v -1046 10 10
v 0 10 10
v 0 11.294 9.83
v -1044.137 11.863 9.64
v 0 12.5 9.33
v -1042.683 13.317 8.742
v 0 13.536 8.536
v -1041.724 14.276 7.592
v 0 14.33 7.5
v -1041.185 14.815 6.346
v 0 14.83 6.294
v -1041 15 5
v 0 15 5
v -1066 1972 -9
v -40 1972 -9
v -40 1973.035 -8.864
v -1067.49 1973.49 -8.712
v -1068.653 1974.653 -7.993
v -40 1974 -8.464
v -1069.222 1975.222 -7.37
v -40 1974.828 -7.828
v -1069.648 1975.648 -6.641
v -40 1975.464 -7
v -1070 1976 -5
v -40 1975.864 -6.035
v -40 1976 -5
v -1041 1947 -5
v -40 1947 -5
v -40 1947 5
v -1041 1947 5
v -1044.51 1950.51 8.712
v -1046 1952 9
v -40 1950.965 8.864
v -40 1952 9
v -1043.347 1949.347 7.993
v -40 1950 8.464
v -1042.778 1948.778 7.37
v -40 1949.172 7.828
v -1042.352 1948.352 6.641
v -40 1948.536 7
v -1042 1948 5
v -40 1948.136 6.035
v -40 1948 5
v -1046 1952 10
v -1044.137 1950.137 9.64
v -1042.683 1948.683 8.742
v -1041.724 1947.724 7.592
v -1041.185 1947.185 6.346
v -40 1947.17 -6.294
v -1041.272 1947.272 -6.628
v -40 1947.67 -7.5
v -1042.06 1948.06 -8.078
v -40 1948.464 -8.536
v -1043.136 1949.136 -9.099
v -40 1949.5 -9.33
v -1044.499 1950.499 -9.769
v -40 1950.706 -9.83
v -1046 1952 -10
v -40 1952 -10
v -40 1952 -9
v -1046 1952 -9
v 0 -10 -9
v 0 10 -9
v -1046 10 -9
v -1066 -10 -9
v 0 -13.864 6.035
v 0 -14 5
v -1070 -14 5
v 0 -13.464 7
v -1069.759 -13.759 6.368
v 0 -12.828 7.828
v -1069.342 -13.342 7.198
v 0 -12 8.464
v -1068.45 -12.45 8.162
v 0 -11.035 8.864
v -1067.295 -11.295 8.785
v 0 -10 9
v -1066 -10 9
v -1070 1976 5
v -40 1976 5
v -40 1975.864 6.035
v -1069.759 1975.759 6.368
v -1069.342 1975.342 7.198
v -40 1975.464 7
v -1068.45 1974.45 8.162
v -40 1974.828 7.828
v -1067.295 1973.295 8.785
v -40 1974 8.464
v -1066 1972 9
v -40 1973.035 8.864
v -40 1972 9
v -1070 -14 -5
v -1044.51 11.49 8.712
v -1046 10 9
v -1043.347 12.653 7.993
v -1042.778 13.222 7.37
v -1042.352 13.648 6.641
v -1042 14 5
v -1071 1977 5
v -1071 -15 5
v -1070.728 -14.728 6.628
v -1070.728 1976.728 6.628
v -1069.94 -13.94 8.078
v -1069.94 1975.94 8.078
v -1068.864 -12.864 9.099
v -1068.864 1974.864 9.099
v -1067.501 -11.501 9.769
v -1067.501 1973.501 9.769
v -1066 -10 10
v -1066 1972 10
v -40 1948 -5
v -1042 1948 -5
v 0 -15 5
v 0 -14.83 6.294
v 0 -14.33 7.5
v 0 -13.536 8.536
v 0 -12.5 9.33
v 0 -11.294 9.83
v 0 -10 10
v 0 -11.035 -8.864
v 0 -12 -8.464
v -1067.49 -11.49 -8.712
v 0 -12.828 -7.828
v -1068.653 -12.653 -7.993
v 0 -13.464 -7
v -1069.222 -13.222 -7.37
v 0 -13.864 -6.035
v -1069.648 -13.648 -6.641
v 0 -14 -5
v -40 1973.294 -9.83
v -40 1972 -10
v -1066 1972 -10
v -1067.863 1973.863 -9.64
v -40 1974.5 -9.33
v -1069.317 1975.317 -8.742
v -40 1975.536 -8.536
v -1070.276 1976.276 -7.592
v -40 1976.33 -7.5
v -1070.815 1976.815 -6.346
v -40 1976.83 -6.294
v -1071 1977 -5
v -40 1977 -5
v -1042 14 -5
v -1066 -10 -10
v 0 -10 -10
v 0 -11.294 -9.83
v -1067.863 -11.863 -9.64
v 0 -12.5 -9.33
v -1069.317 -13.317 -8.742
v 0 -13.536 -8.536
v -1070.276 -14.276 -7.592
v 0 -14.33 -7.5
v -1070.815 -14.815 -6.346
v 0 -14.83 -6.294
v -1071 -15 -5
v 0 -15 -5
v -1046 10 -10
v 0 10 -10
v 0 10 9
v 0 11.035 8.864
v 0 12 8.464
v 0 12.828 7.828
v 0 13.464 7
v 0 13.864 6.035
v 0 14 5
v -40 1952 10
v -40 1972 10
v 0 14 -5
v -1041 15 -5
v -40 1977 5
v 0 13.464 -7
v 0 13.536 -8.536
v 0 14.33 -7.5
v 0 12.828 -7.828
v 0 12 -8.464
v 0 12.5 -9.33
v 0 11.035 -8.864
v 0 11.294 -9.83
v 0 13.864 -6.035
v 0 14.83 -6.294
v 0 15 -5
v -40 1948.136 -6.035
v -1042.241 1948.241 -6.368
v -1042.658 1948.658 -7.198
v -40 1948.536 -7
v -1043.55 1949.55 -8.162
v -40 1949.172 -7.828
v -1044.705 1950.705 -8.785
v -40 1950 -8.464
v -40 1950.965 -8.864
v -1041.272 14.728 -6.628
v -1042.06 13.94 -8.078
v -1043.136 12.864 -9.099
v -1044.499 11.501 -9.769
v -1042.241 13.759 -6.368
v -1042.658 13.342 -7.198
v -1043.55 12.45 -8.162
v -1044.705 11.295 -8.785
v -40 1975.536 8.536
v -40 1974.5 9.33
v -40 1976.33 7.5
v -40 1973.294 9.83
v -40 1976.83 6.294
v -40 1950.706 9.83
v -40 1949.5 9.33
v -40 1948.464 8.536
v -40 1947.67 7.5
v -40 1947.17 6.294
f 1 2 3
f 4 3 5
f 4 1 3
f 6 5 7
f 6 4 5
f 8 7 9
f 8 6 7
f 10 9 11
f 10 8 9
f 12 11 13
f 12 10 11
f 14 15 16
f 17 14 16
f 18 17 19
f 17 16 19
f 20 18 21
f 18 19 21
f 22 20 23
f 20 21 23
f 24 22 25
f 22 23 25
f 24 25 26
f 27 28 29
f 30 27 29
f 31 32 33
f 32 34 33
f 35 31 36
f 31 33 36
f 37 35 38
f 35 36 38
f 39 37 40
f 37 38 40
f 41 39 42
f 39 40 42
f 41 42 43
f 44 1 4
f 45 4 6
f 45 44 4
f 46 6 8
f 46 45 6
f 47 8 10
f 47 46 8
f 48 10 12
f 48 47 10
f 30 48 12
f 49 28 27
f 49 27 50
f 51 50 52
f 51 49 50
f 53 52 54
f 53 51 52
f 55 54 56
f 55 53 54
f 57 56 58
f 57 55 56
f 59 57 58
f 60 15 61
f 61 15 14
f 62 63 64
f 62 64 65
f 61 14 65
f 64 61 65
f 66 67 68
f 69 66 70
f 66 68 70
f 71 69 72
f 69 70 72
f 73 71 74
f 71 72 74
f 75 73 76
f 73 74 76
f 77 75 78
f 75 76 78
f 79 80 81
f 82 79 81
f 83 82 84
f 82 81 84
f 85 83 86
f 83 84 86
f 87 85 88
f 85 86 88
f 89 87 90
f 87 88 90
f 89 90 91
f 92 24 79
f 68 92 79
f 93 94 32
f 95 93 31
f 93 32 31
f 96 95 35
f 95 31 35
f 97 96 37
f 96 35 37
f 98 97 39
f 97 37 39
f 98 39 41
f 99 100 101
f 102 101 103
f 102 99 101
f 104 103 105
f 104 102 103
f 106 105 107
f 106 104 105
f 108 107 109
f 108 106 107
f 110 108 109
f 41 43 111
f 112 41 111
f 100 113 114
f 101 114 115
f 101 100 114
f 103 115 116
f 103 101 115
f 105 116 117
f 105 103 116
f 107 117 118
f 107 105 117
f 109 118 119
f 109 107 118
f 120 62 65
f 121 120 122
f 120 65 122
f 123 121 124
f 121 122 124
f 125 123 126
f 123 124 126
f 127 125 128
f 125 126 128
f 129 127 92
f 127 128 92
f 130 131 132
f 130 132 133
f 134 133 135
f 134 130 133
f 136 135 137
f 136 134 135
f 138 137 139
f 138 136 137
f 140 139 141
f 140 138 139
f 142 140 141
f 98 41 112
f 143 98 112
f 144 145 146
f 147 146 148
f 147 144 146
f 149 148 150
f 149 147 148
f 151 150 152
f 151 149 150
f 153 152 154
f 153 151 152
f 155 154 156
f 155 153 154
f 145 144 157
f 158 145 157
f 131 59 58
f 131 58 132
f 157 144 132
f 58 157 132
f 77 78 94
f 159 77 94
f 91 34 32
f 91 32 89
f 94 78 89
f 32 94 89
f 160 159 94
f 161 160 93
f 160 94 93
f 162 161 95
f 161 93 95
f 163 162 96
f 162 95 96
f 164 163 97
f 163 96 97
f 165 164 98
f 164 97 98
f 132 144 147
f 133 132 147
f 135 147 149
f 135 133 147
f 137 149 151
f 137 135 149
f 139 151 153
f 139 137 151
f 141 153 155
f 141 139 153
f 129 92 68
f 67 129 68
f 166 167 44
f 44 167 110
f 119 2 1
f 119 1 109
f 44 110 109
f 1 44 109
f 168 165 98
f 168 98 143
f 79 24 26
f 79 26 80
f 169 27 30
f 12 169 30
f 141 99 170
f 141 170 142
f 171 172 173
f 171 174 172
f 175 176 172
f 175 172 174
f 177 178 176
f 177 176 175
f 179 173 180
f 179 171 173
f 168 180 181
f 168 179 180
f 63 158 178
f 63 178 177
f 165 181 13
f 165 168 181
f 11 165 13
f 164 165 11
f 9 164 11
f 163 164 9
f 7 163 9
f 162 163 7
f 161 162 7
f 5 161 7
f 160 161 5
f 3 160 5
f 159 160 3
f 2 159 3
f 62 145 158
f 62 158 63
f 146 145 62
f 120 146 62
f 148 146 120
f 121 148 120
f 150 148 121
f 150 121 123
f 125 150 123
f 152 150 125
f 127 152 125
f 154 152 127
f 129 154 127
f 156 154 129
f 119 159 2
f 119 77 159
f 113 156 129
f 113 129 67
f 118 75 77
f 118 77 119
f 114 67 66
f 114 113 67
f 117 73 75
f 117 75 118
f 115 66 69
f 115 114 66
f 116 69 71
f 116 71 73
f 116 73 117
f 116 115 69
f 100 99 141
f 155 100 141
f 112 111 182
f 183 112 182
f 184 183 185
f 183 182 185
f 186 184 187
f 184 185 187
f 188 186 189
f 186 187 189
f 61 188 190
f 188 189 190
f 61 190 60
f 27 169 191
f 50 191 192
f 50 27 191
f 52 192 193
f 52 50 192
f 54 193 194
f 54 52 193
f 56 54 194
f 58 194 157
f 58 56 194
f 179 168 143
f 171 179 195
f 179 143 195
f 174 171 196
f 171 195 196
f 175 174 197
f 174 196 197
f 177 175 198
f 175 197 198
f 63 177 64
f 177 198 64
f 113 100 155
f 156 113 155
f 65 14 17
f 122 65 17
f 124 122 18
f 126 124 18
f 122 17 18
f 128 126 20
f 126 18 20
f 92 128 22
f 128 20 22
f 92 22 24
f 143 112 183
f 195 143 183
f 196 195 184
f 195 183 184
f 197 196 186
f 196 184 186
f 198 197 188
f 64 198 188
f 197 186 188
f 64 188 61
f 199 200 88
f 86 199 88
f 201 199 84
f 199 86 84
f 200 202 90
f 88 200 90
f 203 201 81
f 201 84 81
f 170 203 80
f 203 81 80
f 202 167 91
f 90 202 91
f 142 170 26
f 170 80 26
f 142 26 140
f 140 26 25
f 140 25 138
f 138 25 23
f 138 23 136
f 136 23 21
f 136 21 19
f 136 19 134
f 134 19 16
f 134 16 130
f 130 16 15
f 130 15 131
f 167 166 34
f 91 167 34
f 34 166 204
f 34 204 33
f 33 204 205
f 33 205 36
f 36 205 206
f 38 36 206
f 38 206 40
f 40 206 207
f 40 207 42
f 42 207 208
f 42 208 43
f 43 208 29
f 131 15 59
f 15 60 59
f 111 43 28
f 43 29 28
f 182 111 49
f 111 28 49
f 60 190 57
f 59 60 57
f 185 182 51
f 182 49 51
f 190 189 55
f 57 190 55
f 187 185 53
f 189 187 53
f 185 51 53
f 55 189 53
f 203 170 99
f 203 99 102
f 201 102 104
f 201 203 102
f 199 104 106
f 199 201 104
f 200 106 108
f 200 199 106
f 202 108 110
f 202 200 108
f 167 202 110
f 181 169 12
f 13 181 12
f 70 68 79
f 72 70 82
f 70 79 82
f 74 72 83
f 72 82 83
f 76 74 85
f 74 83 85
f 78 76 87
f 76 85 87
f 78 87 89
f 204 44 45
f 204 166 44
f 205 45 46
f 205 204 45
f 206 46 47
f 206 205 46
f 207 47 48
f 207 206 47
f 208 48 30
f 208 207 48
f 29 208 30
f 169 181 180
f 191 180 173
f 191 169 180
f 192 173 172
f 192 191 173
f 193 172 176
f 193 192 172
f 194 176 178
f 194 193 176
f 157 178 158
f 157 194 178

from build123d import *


with BuildPart() as f2:
    # F2: sweep along a path in F1
    with BuildLine(Plane.XY) as f2_path:
        Line((0, 0), (-1056, 0))
        Line((-1056, 0), (-1056, 1962))
        Line((-1056, 1962), (-40, 1962))
    # F0 (on Right) → F2 (sweep)
    with BuildSketch(Plane.YZ):
        with BuildLine():
            ThreePointArc((15, 5), (13.5355339059, 8.5355339059), (10, 10))
            Line((10, 10), (-10, 10))
            ThreePointArc((-10, 10), (-13.5355339059, 8.5355339059), (-15, 5))
            Line((-15, 5), (-15, -5))
            ThreePointArc((-15, -5), (-13.5355339059, -8.5355339059), (-10, -10))
            Line((-10, -10), (10, -10))
            ThreePointArc((10, -10), (13.5355339059, -8.5355339059), (15, -5))
            Line((15, -5), (15, 5))
        make_face()
        with BuildLine():
            ThreePointArc((10, 9), (12.8284271247, 7.8284271247), (14, 5))
            Line((14, 5), (14, -5))
            ThreePointArc((14, -5), (12.8284271247, -7.8284271247), (10, -9))
            Line((10, -9), (-10, -9))
            ThreePointArc((-10, -9), (-12.8284271247, -7.8284271247), (-14, -5))
            Line((-14, -5), (-14, 5))
            ThreePointArc((-14, 5), (-12.8284271247, 7.8284271247), (-10, 9))
            Line((-10, 9), (10, 9))
        make_face(mode=Mode.SUBTRACT)
    sweep(path=f2_path.line, transition=Transition.RIGHT)


solid = f2.part
